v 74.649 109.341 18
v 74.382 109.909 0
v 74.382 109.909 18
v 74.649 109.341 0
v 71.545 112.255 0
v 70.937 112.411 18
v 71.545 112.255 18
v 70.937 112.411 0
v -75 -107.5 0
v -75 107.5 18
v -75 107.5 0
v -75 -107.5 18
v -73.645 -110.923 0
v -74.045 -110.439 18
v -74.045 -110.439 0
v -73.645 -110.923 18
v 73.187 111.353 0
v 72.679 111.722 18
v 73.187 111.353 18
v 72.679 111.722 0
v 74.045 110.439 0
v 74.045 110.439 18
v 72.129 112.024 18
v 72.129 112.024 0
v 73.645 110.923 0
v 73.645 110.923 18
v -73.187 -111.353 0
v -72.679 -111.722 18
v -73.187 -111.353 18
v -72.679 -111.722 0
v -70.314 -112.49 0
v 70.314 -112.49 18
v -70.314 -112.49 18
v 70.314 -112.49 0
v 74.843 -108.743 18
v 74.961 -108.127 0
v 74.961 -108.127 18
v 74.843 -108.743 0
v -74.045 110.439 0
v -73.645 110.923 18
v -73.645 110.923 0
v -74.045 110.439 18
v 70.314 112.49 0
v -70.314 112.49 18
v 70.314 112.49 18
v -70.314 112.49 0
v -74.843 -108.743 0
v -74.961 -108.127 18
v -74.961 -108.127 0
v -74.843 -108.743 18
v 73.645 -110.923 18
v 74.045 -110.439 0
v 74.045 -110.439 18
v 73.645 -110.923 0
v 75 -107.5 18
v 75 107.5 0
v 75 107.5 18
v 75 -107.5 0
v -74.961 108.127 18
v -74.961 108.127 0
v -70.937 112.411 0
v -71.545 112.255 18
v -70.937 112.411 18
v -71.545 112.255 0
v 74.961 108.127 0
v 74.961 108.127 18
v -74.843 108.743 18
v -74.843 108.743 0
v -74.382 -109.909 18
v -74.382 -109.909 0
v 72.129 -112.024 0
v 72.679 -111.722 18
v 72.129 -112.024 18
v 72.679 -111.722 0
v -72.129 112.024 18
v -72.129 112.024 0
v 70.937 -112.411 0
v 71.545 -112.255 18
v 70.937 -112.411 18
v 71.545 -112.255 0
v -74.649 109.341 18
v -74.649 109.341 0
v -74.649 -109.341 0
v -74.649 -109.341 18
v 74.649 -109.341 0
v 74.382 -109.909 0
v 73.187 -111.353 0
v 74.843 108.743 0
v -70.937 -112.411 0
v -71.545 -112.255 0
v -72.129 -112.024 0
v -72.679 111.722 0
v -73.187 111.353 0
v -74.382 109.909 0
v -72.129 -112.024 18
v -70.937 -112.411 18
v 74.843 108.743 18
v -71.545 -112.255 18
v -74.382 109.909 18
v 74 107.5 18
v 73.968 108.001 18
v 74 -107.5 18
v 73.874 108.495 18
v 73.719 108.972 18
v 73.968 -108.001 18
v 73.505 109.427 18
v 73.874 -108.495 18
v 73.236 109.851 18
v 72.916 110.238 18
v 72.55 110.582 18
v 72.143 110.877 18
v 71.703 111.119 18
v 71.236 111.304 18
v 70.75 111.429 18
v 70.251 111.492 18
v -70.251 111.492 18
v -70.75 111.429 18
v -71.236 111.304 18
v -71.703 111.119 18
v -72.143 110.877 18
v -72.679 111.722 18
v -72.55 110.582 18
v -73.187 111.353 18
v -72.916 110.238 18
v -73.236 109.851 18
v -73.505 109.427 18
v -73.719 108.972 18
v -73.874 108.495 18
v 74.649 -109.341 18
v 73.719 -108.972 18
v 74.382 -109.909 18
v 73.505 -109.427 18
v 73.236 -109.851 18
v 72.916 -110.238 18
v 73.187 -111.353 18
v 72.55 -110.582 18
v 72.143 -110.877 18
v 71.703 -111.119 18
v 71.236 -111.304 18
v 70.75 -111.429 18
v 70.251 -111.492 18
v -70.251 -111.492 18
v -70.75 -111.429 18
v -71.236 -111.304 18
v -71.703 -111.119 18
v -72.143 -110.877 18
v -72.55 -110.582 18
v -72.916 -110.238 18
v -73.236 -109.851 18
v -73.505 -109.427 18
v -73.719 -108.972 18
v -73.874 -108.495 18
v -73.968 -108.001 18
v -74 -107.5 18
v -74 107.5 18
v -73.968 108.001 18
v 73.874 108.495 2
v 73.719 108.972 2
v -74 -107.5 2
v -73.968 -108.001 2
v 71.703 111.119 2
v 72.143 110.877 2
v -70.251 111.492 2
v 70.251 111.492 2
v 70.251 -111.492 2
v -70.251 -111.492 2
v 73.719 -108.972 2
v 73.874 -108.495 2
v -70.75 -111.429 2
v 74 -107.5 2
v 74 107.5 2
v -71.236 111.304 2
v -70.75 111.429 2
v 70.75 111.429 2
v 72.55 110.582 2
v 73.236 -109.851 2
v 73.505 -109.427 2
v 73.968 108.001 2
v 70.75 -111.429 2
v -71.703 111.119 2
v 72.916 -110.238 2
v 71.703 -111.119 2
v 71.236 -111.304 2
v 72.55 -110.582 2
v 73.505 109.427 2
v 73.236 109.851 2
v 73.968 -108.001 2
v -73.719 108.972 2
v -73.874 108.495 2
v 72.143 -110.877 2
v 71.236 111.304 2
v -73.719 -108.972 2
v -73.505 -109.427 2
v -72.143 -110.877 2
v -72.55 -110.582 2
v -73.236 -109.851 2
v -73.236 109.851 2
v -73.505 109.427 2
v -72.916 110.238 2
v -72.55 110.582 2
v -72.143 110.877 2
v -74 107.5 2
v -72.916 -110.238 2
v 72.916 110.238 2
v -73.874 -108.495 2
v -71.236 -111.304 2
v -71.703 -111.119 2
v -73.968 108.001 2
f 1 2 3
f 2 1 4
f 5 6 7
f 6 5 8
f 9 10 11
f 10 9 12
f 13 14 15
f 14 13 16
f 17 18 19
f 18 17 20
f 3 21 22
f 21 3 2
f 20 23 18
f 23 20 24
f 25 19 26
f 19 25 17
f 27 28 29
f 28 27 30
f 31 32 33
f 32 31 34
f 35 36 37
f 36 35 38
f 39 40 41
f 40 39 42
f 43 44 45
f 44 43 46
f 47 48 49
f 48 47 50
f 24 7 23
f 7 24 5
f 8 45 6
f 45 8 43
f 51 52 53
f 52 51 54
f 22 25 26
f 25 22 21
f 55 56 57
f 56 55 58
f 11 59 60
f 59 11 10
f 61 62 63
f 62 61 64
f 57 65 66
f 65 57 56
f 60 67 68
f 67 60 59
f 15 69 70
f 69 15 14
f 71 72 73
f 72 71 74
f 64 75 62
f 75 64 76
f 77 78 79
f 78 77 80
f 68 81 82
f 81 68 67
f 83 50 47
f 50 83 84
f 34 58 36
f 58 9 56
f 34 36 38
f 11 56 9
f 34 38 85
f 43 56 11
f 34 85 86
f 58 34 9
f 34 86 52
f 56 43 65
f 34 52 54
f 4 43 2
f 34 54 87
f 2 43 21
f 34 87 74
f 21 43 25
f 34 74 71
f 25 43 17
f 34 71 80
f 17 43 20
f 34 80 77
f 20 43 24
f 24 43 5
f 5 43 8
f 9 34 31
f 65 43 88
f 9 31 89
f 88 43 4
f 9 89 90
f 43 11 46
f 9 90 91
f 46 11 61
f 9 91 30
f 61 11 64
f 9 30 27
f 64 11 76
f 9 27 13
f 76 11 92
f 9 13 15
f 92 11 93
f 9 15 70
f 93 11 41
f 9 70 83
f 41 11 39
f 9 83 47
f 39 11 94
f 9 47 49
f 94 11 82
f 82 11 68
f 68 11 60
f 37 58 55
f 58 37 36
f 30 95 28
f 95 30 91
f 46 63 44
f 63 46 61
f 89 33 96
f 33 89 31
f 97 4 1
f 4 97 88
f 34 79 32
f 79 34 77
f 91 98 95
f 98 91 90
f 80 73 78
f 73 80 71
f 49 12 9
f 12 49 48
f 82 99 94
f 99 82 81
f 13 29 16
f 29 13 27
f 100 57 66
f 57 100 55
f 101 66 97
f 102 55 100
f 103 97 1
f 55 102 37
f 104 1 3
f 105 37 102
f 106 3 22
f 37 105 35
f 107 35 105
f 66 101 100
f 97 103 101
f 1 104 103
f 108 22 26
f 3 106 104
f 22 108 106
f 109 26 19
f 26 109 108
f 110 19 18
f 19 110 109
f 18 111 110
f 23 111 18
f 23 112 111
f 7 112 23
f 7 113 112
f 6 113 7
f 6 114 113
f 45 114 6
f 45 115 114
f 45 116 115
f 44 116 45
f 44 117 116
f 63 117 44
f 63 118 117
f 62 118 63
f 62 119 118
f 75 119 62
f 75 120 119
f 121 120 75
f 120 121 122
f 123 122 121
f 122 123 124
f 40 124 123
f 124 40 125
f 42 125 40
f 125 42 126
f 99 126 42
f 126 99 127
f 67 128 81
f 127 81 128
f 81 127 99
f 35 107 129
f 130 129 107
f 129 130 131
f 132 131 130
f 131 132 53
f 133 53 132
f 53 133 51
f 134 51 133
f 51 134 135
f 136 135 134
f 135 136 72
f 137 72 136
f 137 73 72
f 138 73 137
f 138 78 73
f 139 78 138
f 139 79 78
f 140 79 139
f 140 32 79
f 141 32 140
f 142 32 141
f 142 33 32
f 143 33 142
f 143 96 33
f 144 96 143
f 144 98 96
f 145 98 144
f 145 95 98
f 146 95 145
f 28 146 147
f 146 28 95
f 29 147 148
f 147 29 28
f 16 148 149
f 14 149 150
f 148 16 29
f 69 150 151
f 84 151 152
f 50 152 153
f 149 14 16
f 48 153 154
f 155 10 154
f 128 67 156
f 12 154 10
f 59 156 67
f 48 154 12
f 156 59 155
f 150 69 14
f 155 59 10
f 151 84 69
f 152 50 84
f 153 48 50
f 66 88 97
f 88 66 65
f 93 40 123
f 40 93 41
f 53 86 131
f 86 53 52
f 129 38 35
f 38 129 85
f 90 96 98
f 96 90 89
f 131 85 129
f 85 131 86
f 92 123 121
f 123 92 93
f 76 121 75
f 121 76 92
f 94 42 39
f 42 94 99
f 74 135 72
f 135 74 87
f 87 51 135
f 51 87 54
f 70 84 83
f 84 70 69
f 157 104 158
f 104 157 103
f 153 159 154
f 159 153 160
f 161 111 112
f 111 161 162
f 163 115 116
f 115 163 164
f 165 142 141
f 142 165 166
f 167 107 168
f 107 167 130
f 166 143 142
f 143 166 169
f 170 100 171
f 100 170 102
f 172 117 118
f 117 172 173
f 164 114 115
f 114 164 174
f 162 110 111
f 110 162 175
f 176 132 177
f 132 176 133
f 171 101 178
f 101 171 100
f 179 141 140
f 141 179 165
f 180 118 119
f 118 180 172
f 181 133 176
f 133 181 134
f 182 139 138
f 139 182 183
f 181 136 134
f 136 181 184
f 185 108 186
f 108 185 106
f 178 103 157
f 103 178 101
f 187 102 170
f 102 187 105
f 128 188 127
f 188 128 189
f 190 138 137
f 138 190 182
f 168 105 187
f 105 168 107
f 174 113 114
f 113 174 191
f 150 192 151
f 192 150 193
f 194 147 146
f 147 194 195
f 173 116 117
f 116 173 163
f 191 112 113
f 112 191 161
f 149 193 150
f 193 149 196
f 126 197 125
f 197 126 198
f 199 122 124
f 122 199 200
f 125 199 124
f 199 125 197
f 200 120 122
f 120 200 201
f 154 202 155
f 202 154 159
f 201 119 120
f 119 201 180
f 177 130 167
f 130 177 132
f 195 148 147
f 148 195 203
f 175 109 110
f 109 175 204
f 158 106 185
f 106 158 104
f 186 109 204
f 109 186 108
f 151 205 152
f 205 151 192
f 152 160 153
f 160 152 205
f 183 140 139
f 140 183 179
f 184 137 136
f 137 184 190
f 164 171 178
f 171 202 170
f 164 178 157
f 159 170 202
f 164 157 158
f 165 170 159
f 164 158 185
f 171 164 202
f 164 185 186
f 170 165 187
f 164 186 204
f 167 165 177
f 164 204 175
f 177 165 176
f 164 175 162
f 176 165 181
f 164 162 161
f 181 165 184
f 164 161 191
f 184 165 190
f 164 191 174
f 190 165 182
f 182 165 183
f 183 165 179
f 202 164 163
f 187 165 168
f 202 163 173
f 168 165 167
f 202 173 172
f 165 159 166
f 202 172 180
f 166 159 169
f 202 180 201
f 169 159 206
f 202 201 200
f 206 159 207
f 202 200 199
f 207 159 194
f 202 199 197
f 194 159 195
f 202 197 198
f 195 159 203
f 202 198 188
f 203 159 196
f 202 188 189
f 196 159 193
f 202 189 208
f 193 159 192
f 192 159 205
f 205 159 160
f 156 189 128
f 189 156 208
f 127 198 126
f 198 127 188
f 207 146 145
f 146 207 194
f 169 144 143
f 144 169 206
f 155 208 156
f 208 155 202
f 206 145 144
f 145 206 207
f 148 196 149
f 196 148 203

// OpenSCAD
$fn = 50;


difference() {
	union() {
		hull() {
			translate(v = [-70.0000000000, 107.5000000000, 0]) {
				cylinder(h = 18, r = 5);
			}
			translate(v = [70.0000000000, 107.5000000000, 0]) {
				cylinder(h = 18, r = 5);
			}
			translate(v = [-70.0000000000, -107.5000000000, 0]) {
				cylinder(h = 18, r = 5);
			}
			translate(v = [70.0000000000, -107.5000000000, 0]) {
				cylinder(h = 18, r = 5);
			}
		}
	}
	union() {
		translate(v = [0, 0, 2]) {
			hull() {
				translate(v = [-70.0000000000, 107.5000000000, 0]) {
					cylinder(h = 16, r = 4);
				}
				translate(v = [70.0000000000, 107.5000000000, 0]) {
					cylinder(h = 16, r = 4);
				}
				translate(v = [-70.0000000000, -107.5000000000, 0]) {
					cylinder(h = 16, r = 4);
				}
				translate(v = [70.0000000000, -107.5000000000, 0]) {
					cylinder(h = 16, r = 4);
				}
			}
		}
	}
}
